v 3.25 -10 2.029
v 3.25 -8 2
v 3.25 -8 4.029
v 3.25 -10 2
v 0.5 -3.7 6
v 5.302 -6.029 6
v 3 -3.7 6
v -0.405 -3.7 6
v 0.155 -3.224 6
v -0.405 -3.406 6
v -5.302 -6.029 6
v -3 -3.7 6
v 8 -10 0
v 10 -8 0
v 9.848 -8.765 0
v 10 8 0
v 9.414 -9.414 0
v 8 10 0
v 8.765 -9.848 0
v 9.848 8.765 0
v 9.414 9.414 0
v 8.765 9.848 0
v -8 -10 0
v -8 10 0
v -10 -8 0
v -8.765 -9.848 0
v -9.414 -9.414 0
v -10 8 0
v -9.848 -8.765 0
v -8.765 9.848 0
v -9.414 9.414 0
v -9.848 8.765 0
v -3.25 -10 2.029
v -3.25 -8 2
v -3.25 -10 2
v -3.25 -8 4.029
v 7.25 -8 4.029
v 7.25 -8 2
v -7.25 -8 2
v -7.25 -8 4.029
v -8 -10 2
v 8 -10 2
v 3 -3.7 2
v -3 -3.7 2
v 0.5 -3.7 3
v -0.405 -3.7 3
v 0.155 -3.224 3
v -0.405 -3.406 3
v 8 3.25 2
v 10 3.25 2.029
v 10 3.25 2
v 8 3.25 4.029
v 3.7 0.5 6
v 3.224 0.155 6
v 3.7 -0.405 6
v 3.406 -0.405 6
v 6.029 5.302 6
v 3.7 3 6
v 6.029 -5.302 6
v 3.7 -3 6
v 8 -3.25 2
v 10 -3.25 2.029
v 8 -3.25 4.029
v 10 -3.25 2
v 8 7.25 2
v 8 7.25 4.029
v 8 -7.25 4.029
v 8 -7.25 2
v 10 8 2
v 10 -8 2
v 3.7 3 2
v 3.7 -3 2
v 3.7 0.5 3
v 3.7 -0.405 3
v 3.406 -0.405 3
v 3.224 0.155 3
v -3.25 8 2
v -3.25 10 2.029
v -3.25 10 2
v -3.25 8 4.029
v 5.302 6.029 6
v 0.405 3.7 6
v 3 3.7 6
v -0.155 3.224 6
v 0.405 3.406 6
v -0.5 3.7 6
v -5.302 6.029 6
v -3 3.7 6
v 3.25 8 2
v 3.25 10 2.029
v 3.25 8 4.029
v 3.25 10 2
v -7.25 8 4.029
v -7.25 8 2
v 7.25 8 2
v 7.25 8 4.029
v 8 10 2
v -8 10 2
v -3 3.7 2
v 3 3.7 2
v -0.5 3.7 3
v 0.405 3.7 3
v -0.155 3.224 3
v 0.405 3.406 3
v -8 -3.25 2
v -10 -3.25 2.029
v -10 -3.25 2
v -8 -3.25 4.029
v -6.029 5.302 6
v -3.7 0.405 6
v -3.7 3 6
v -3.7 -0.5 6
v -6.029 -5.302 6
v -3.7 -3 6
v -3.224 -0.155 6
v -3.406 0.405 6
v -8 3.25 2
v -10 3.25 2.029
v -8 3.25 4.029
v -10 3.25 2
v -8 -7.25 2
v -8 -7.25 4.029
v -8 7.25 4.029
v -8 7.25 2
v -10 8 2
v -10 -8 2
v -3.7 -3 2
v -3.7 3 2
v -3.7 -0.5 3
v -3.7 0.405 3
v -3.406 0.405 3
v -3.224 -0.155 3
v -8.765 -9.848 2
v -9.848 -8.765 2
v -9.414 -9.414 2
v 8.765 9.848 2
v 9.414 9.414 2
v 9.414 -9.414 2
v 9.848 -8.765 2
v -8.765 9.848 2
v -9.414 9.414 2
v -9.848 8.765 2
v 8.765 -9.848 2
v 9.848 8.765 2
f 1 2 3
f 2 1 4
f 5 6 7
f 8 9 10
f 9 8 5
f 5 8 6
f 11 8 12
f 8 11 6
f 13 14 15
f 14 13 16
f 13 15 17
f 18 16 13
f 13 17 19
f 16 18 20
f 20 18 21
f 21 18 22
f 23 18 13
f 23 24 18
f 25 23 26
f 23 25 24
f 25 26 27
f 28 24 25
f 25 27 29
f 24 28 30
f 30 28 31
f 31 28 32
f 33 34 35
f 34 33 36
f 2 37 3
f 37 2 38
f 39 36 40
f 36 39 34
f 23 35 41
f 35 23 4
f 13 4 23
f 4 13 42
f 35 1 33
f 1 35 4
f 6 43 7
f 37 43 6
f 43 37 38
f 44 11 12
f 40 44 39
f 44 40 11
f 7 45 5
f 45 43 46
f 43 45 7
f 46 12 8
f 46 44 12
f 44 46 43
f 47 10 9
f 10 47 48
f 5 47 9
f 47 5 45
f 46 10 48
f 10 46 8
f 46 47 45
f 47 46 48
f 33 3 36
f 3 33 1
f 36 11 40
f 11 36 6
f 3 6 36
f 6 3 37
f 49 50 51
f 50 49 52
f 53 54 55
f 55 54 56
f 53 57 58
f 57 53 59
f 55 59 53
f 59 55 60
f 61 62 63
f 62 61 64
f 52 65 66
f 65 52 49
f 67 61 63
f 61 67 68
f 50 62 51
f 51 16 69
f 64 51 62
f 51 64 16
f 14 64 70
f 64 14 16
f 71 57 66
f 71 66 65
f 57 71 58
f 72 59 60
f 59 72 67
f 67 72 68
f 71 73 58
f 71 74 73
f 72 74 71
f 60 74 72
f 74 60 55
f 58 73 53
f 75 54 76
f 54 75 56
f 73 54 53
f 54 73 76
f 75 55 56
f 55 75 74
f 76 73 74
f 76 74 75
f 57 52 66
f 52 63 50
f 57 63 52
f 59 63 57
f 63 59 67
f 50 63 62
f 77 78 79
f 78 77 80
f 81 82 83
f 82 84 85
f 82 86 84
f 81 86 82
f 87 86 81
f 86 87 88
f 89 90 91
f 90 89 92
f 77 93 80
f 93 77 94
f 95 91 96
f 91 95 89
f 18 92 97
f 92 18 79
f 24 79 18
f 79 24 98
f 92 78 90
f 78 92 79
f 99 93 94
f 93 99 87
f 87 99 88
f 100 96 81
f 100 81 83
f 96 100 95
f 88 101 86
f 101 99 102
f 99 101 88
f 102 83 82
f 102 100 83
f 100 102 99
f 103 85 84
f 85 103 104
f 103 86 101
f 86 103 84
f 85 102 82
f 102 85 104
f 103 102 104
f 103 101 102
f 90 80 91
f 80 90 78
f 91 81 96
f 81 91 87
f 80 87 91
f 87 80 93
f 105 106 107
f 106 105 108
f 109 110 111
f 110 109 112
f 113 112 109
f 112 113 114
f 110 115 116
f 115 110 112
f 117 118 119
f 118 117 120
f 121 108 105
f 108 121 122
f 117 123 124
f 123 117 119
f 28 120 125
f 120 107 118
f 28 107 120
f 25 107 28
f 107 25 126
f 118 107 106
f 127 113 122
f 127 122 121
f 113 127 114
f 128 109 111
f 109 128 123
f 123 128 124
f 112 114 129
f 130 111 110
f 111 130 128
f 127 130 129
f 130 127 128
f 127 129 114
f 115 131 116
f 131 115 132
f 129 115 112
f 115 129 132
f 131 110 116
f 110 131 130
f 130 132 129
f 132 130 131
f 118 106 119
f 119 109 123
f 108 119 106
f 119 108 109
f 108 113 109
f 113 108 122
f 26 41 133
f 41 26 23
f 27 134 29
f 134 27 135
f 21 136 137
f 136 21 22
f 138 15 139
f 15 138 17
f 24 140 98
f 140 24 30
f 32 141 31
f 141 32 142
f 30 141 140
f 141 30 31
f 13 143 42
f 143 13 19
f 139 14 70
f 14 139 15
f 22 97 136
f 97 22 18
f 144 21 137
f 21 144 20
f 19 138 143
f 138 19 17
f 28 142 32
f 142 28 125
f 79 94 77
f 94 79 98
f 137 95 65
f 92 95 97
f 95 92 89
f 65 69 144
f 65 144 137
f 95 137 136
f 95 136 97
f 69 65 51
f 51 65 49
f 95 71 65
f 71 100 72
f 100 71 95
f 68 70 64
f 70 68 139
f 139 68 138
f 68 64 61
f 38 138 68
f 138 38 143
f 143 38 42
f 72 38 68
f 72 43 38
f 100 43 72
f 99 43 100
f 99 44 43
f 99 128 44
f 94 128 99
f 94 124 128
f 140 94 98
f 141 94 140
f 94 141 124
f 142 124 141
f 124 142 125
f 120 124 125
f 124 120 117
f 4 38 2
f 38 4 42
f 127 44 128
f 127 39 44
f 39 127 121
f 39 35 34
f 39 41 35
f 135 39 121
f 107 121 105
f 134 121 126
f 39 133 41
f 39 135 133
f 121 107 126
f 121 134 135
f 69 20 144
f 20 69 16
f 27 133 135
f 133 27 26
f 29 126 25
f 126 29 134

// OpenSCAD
slot_width=6.5;
slot_thickness=2;
t_depth=0;
trap_bot_width=14.5;
trap_top_width=6;
trap_depth=4.3;

extrusion_width=20;
cover_thickness=2;
corner_rounding=2;
hole_size=0;

tab_height=6;

difference() {
	union() {
		for (a=[0:3])
			rotate([0,0,90*a])
				translate([0,-extrusion_width/2,0])
					difference() {
                        t_slot();
                        translate([0,0,9.1]) rotate([45,0,0]) cube([20,10,10],true);
                    }
		
		translate([-extrusion_width/2+corner_rounding, -extrusion_width/2+corner_rounding,0])
			minkowski() {
				cube([extrusion_width-corner_rounding*2,extrusion_width-corner_rounding*2,cover_thickness-1]);
				cylinder(r=corner_rounding, h=1, $fn=16);
			}
	}
	cylinder(r=hole_size/2, h=cover_thickness*4, center=true);
}

module t_slot() {
	translate([-slot_width/2,0,0])
		cube([slot_width, slot_thickness+t_depth, tab_height]);
	translate([0,slot_thickness+t_depth,0])
		linear_extrude(height=tab_height)
			trapezoid(bottom=trap_bot_width, top=trap_top_width, height=trap_depth);
	translate([0,slot_thickness+t_depth+trap_depth,cover_thickness+1])
        cylinder(tab_height-cover_thickness-1, r=0.5,center=false);
}


module trapezoid(bottom=10, top=5, height=2)
{
	polygon(points=[[-bottom/2,0],[bottom/2,0],[top/2,height],[-top/2,height]]);
}
